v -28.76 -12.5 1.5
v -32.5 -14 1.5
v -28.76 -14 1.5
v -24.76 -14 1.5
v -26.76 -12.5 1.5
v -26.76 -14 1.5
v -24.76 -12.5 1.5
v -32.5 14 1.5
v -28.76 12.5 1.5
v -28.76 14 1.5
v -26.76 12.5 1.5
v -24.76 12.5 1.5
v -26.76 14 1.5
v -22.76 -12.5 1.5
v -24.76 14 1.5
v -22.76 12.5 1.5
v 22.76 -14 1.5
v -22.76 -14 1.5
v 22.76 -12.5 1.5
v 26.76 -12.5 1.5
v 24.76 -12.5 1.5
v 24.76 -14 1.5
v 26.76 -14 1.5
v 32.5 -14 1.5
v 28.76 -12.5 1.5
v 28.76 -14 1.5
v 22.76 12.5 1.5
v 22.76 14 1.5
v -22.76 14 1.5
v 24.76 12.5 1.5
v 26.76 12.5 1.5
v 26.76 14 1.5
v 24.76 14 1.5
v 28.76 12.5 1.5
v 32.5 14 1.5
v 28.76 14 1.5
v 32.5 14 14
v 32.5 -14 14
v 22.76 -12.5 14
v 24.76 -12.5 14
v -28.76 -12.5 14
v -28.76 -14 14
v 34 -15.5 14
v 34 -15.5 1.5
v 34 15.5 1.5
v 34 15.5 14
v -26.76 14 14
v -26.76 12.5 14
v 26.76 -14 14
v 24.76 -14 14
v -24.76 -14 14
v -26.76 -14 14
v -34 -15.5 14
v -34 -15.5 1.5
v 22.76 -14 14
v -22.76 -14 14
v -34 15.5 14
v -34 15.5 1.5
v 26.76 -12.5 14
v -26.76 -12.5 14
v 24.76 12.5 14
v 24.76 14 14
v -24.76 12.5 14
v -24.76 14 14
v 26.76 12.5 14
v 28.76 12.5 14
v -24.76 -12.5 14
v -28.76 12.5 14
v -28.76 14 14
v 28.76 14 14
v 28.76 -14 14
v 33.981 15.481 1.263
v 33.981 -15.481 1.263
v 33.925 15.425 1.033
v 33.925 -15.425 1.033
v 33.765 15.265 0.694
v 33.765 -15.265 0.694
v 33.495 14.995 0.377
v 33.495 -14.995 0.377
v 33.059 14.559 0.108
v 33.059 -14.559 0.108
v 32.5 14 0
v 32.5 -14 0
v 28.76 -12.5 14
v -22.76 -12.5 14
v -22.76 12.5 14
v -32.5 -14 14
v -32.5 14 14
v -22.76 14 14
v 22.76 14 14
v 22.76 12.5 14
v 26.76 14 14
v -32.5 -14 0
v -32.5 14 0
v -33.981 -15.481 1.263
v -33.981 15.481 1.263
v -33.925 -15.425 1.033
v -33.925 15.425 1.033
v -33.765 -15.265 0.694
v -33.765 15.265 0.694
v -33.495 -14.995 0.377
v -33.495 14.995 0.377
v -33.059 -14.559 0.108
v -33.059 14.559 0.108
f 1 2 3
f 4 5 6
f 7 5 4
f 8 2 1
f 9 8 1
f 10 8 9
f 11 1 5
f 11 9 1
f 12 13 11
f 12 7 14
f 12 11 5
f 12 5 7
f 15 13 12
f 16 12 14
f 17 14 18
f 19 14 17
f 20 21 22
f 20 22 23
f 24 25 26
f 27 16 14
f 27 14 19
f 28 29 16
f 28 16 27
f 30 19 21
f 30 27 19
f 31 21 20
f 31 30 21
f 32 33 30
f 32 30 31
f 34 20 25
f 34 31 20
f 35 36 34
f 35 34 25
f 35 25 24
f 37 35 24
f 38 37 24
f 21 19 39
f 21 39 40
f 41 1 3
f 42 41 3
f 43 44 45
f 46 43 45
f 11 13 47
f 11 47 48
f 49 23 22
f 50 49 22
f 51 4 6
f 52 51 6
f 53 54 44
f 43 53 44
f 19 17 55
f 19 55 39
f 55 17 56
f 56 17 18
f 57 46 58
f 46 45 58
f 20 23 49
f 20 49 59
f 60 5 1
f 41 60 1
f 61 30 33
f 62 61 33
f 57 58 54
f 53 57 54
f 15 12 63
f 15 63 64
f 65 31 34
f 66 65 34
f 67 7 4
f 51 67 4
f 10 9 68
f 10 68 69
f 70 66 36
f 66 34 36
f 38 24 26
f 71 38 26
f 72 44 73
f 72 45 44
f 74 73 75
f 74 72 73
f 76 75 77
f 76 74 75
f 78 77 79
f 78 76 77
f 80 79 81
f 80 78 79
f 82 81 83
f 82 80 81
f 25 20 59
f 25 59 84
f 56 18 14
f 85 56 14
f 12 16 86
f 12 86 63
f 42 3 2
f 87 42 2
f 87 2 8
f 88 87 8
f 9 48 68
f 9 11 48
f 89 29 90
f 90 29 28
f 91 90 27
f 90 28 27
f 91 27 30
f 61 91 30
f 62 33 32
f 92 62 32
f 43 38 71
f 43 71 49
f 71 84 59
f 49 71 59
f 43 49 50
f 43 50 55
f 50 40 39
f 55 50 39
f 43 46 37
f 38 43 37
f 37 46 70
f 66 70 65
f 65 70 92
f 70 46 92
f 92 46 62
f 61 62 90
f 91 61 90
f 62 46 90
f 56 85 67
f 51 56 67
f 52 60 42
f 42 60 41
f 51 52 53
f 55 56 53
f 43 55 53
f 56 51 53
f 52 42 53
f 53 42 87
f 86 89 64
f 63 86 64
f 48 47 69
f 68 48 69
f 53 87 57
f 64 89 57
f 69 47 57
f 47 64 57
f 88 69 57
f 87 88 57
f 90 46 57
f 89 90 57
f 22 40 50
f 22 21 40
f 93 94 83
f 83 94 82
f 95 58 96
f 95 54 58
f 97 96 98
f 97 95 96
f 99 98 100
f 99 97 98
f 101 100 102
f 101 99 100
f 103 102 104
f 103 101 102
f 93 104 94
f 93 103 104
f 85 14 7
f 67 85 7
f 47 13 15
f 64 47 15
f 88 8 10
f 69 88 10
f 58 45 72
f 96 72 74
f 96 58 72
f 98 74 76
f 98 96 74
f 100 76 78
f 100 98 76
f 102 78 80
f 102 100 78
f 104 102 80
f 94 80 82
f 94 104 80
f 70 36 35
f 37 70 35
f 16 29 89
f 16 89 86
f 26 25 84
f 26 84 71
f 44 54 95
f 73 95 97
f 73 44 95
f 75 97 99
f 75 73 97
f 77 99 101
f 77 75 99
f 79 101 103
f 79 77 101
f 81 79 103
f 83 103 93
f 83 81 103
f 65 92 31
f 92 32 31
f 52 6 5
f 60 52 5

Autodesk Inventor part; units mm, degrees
ref_plane "YZ Plane" through (0, 0, 0) normal (1, 0, 0) x (0, 1, 0)
ref_plane "XZ Plane" through (0, 0, 0) normal (0, 1, 0) x (-1, 0, 0)
ref_plane "XY Plane" through (0, 0, 0) normal (0, 0, 1) x (1, 0, 0)
sketch "Skizze2" plane through (0, 0, 0) normal (0, 0, 1) x (1, 0, 0)
  line L0 (-32.5, 14) -> (32.5, 14)
  line L1 (32.5, 14) -> (32.5, -14)
  line L2 (32.5, -14) -> (-32.5, -14)
  line L3 (-32.5, -14) -> (-32.5, 14)
  line L4 (-32.5, 14) -> (32.5, -14) construction
  line L5 (32.5, 14) -> (-32.5, -14) construction
  point P0 (0, 0)
  dimension "d0" = 65
  dimension "d1" = 28
extrude "Extrusion1" add sketch "Skizze2" along normal blind 1.5
sketch "Skizze4" plane through (0, 0, 0) normal (0, 0, -1) x (-1, 0, 0)
  line L0 (32.5, 14) -> (-32.5, 14) projected
  line L1 (-32.5, 14) -> (-32.5, -14) projected
  line L2 (-32.5, -14) -> (32.5, -14) projected
  line L3 (32.5, -14) -> (32.5, 14) projected
  line L4 (34, -15.5) -> (-34, -15.5)
  line L5 (-34, -15.5) -> (-34, 15.5)
  line L6 (-34, 15.5) -> (34, 15.5)
  line L7 (34, 15.5) -> (34, -15.5)
  point P0 (0, 0)
  dimension "d4" = 1.5
extrude "Extrusion2" add sketch "Skizze4" against normal blind 14
fillet "Rundung1" radius 1.5 4 edges at (0, -15.5, 0) (0, 15.5, 0) (34, 0, 0) (-34, 0, 0)
sketch "Skizze5" plane through (0, 0, 1.5) normal (0, 0, 1) x (1, 0, 0)
  line L0 (0, -21.0221) -> (0, 21.9802) construction
  line L1 (-32.5, -14) -> (32.5, -14) projected
  line L2 (-28.7599, -14) -> (-26.7599, -14)
  line L3 (-26.7599, -14) -> (-26.7599, -12.5)
  line L4 (-26.7599, -12.5) -> (-28.7599, -12.5)
  line L5 (-28.7599, -12.5) -> (-28.7599, -14)
  line L6 (-24.7599, -14) -> (-22.7599, -14)
  line L7 (-22.7599, -14) -> (-22.7599, -12.5)
  line L8 (-22.7599, -12.5) -> (-24.7599, -12.5)
  line L9 (-24.7599, -12.5) -> (-24.7599, -14)
  line L10 (-34, 15.5) -> (-34, -15.5) construction
  line L11 (-34, 0) -> (34, 0) construction
  line L12 (34, -15.5) -> (34, 15.5) construction
  line L13 (28.7599, -14) -> (26.7599, -14)
  line L14 (26.7599, -14) -> (26.7599, -12.5)
  line L15 (26.7599, -12.5) -> (28.7599, -12.5)
  line L16 (28.7599, -12.5) -> (28.7599, -14)
  line L17 (24.7599, -14) -> (22.7599, -14)
  line L18 (22.7599, -14) -> (22.7599, -12.5)
  line L19 (22.7599, -12.5) -> (24.7599, -12.5)
  line L20 (24.7599, -12.5) -> (24.7599, -14)
  line L21 (34, 15.5) -> (34, -15.5) construction
  line L22 (-28.7599, 14) -> (-26.7599, 14)
  line L23 (-26.7599, 14) -> (-26.7599, 12.5)
  line L24 (-26.7599, 12.5) -> (-28.7599, 12.5)
  line L25 (-28.7599, 12.5) -> (-28.7599, 14)
  line L26 (-24.7599, 14) -> (-22.7599, 14)
  line L27 (-22.7599, 14) -> (-22.7599, 12.5)
  line L28 (-22.7599, 12.5) -> (-24.7599, 12.5)
  line L29 (-24.7599, 12.5) -> (-24.7599, 14)
  line L30 (22.7599, 14) -> (22.7599, 12.5)
  line L31 (24.7599, 14) -> (22.7599, 14)
  line L32 (22.7599, 12.5) -> (24.7599, 12.5)
  line L33 (24.7599, 12.5) -> (24.7599, 14)
  line L34 (26.7599, 14) -> (26.7599, 12.5)
  line L35 (28.7599, 14) -> (26.7599, 14)
  line L36 (26.7599, 12.5) -> (28.7599, 12.5)
  line L37 (28.7599, 12.5) -> (28.7599, 14)
  point P0 (0, 0)
  dimension "d11" = 2
  dimension "d12" = 1.5
  dimension "d13" = 2
  dimension "d14" = 2
extrude "Extrusion4" add sketch "Skizze5" along normal blind 12.5
properties part number "Unterteil"
